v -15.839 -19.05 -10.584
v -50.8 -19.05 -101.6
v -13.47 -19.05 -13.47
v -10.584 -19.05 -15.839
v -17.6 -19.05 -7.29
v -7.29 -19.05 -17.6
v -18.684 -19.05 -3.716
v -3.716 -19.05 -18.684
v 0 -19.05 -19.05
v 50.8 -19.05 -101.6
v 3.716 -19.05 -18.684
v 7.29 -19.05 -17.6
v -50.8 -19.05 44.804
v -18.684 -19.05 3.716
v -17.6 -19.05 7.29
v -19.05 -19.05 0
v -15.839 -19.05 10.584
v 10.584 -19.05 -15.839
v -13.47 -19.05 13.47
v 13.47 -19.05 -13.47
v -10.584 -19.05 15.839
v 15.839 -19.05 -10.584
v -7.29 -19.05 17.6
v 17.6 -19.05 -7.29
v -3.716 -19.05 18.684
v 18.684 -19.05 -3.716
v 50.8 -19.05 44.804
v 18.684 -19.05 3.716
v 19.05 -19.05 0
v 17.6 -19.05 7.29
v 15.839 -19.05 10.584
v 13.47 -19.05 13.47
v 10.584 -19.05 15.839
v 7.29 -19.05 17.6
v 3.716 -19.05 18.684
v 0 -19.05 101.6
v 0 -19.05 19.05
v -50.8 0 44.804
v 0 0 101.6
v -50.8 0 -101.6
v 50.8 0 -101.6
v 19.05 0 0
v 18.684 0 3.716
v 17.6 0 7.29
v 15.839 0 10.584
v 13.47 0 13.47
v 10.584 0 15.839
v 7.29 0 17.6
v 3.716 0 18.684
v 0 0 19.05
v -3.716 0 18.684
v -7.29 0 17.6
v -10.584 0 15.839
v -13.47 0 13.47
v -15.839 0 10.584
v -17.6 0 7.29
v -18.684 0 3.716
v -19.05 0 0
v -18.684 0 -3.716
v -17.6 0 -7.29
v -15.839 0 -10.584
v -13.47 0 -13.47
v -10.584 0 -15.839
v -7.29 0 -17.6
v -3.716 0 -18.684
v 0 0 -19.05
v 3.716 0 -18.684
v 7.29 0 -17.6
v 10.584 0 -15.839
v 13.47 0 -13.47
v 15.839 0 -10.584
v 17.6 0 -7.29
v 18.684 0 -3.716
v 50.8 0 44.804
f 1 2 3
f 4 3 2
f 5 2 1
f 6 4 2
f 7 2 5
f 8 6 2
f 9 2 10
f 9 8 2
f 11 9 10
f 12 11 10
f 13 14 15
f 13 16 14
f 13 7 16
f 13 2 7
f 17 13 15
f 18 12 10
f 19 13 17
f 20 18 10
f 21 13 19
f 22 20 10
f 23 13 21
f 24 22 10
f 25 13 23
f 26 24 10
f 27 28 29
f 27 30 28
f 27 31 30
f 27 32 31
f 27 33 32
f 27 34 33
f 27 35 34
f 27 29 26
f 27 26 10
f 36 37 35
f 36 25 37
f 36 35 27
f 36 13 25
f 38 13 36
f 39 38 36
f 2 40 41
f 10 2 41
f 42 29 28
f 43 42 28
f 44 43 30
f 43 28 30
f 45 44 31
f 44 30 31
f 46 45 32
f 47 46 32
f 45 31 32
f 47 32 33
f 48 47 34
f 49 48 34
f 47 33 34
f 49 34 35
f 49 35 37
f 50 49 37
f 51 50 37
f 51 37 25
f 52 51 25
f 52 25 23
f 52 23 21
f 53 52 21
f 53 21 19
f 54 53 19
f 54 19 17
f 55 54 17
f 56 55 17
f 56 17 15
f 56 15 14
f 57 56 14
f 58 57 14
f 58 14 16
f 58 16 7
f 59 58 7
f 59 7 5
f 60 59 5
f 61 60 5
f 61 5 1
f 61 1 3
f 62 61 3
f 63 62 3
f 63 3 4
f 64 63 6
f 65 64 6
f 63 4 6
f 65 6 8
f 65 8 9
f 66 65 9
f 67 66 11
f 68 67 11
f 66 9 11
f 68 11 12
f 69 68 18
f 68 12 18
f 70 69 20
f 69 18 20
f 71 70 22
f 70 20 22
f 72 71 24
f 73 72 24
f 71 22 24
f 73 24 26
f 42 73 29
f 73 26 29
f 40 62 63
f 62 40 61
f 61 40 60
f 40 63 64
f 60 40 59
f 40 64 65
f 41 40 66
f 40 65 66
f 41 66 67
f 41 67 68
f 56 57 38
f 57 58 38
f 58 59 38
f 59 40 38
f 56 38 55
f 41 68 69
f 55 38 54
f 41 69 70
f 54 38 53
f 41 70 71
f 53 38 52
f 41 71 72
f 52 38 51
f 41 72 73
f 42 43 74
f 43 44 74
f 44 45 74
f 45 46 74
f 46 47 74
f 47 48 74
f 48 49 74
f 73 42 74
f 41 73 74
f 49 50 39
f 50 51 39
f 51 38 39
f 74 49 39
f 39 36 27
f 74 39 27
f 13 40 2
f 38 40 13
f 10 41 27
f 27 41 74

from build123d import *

# Parameters (mm, degrees)
F0_W     = 101.6
F0_H     = 203.2
F1_DEPTH = 19.05
F3_DEPTH = 19.051
F4_R     = 19.05
F5_DEPTH = 19.051


# Not quite as in the source:
# - a feature names something its author has since deleted; it is built from what else it names


with BuildPart() as f1:
    # F0 (on Front) → F1 (new body)
    with BuildSketch(Plane.XZ):
        Rectangle(F0_W, F0_H)
    extrude(amount=F1_DEPTH)

    # F2 (on face) → F3 (cut, through all)
    with BuildSketch(Plane.XZ.offset(19.05)):
        Polygon((-50.8, 44.8038733715), (0, 101.6), (-50.8, 101.6), align=None)
        Polygon((50.8, 101.6), (0, 101.6), (50.8, 44.8038733715), align=None)
    extrude(amount=-F3_DEPTH, mode=Mode.SUBTRACT)

    # F4 (on face) → F5 (cut, through all)
    with BuildSketch(Plane.XZ.offset(19.05)):
        Circle(F4_R)
    extrude(amount=-F5_DEPTH, mode=Mode.SUBTRACT)


solid = f1.part
